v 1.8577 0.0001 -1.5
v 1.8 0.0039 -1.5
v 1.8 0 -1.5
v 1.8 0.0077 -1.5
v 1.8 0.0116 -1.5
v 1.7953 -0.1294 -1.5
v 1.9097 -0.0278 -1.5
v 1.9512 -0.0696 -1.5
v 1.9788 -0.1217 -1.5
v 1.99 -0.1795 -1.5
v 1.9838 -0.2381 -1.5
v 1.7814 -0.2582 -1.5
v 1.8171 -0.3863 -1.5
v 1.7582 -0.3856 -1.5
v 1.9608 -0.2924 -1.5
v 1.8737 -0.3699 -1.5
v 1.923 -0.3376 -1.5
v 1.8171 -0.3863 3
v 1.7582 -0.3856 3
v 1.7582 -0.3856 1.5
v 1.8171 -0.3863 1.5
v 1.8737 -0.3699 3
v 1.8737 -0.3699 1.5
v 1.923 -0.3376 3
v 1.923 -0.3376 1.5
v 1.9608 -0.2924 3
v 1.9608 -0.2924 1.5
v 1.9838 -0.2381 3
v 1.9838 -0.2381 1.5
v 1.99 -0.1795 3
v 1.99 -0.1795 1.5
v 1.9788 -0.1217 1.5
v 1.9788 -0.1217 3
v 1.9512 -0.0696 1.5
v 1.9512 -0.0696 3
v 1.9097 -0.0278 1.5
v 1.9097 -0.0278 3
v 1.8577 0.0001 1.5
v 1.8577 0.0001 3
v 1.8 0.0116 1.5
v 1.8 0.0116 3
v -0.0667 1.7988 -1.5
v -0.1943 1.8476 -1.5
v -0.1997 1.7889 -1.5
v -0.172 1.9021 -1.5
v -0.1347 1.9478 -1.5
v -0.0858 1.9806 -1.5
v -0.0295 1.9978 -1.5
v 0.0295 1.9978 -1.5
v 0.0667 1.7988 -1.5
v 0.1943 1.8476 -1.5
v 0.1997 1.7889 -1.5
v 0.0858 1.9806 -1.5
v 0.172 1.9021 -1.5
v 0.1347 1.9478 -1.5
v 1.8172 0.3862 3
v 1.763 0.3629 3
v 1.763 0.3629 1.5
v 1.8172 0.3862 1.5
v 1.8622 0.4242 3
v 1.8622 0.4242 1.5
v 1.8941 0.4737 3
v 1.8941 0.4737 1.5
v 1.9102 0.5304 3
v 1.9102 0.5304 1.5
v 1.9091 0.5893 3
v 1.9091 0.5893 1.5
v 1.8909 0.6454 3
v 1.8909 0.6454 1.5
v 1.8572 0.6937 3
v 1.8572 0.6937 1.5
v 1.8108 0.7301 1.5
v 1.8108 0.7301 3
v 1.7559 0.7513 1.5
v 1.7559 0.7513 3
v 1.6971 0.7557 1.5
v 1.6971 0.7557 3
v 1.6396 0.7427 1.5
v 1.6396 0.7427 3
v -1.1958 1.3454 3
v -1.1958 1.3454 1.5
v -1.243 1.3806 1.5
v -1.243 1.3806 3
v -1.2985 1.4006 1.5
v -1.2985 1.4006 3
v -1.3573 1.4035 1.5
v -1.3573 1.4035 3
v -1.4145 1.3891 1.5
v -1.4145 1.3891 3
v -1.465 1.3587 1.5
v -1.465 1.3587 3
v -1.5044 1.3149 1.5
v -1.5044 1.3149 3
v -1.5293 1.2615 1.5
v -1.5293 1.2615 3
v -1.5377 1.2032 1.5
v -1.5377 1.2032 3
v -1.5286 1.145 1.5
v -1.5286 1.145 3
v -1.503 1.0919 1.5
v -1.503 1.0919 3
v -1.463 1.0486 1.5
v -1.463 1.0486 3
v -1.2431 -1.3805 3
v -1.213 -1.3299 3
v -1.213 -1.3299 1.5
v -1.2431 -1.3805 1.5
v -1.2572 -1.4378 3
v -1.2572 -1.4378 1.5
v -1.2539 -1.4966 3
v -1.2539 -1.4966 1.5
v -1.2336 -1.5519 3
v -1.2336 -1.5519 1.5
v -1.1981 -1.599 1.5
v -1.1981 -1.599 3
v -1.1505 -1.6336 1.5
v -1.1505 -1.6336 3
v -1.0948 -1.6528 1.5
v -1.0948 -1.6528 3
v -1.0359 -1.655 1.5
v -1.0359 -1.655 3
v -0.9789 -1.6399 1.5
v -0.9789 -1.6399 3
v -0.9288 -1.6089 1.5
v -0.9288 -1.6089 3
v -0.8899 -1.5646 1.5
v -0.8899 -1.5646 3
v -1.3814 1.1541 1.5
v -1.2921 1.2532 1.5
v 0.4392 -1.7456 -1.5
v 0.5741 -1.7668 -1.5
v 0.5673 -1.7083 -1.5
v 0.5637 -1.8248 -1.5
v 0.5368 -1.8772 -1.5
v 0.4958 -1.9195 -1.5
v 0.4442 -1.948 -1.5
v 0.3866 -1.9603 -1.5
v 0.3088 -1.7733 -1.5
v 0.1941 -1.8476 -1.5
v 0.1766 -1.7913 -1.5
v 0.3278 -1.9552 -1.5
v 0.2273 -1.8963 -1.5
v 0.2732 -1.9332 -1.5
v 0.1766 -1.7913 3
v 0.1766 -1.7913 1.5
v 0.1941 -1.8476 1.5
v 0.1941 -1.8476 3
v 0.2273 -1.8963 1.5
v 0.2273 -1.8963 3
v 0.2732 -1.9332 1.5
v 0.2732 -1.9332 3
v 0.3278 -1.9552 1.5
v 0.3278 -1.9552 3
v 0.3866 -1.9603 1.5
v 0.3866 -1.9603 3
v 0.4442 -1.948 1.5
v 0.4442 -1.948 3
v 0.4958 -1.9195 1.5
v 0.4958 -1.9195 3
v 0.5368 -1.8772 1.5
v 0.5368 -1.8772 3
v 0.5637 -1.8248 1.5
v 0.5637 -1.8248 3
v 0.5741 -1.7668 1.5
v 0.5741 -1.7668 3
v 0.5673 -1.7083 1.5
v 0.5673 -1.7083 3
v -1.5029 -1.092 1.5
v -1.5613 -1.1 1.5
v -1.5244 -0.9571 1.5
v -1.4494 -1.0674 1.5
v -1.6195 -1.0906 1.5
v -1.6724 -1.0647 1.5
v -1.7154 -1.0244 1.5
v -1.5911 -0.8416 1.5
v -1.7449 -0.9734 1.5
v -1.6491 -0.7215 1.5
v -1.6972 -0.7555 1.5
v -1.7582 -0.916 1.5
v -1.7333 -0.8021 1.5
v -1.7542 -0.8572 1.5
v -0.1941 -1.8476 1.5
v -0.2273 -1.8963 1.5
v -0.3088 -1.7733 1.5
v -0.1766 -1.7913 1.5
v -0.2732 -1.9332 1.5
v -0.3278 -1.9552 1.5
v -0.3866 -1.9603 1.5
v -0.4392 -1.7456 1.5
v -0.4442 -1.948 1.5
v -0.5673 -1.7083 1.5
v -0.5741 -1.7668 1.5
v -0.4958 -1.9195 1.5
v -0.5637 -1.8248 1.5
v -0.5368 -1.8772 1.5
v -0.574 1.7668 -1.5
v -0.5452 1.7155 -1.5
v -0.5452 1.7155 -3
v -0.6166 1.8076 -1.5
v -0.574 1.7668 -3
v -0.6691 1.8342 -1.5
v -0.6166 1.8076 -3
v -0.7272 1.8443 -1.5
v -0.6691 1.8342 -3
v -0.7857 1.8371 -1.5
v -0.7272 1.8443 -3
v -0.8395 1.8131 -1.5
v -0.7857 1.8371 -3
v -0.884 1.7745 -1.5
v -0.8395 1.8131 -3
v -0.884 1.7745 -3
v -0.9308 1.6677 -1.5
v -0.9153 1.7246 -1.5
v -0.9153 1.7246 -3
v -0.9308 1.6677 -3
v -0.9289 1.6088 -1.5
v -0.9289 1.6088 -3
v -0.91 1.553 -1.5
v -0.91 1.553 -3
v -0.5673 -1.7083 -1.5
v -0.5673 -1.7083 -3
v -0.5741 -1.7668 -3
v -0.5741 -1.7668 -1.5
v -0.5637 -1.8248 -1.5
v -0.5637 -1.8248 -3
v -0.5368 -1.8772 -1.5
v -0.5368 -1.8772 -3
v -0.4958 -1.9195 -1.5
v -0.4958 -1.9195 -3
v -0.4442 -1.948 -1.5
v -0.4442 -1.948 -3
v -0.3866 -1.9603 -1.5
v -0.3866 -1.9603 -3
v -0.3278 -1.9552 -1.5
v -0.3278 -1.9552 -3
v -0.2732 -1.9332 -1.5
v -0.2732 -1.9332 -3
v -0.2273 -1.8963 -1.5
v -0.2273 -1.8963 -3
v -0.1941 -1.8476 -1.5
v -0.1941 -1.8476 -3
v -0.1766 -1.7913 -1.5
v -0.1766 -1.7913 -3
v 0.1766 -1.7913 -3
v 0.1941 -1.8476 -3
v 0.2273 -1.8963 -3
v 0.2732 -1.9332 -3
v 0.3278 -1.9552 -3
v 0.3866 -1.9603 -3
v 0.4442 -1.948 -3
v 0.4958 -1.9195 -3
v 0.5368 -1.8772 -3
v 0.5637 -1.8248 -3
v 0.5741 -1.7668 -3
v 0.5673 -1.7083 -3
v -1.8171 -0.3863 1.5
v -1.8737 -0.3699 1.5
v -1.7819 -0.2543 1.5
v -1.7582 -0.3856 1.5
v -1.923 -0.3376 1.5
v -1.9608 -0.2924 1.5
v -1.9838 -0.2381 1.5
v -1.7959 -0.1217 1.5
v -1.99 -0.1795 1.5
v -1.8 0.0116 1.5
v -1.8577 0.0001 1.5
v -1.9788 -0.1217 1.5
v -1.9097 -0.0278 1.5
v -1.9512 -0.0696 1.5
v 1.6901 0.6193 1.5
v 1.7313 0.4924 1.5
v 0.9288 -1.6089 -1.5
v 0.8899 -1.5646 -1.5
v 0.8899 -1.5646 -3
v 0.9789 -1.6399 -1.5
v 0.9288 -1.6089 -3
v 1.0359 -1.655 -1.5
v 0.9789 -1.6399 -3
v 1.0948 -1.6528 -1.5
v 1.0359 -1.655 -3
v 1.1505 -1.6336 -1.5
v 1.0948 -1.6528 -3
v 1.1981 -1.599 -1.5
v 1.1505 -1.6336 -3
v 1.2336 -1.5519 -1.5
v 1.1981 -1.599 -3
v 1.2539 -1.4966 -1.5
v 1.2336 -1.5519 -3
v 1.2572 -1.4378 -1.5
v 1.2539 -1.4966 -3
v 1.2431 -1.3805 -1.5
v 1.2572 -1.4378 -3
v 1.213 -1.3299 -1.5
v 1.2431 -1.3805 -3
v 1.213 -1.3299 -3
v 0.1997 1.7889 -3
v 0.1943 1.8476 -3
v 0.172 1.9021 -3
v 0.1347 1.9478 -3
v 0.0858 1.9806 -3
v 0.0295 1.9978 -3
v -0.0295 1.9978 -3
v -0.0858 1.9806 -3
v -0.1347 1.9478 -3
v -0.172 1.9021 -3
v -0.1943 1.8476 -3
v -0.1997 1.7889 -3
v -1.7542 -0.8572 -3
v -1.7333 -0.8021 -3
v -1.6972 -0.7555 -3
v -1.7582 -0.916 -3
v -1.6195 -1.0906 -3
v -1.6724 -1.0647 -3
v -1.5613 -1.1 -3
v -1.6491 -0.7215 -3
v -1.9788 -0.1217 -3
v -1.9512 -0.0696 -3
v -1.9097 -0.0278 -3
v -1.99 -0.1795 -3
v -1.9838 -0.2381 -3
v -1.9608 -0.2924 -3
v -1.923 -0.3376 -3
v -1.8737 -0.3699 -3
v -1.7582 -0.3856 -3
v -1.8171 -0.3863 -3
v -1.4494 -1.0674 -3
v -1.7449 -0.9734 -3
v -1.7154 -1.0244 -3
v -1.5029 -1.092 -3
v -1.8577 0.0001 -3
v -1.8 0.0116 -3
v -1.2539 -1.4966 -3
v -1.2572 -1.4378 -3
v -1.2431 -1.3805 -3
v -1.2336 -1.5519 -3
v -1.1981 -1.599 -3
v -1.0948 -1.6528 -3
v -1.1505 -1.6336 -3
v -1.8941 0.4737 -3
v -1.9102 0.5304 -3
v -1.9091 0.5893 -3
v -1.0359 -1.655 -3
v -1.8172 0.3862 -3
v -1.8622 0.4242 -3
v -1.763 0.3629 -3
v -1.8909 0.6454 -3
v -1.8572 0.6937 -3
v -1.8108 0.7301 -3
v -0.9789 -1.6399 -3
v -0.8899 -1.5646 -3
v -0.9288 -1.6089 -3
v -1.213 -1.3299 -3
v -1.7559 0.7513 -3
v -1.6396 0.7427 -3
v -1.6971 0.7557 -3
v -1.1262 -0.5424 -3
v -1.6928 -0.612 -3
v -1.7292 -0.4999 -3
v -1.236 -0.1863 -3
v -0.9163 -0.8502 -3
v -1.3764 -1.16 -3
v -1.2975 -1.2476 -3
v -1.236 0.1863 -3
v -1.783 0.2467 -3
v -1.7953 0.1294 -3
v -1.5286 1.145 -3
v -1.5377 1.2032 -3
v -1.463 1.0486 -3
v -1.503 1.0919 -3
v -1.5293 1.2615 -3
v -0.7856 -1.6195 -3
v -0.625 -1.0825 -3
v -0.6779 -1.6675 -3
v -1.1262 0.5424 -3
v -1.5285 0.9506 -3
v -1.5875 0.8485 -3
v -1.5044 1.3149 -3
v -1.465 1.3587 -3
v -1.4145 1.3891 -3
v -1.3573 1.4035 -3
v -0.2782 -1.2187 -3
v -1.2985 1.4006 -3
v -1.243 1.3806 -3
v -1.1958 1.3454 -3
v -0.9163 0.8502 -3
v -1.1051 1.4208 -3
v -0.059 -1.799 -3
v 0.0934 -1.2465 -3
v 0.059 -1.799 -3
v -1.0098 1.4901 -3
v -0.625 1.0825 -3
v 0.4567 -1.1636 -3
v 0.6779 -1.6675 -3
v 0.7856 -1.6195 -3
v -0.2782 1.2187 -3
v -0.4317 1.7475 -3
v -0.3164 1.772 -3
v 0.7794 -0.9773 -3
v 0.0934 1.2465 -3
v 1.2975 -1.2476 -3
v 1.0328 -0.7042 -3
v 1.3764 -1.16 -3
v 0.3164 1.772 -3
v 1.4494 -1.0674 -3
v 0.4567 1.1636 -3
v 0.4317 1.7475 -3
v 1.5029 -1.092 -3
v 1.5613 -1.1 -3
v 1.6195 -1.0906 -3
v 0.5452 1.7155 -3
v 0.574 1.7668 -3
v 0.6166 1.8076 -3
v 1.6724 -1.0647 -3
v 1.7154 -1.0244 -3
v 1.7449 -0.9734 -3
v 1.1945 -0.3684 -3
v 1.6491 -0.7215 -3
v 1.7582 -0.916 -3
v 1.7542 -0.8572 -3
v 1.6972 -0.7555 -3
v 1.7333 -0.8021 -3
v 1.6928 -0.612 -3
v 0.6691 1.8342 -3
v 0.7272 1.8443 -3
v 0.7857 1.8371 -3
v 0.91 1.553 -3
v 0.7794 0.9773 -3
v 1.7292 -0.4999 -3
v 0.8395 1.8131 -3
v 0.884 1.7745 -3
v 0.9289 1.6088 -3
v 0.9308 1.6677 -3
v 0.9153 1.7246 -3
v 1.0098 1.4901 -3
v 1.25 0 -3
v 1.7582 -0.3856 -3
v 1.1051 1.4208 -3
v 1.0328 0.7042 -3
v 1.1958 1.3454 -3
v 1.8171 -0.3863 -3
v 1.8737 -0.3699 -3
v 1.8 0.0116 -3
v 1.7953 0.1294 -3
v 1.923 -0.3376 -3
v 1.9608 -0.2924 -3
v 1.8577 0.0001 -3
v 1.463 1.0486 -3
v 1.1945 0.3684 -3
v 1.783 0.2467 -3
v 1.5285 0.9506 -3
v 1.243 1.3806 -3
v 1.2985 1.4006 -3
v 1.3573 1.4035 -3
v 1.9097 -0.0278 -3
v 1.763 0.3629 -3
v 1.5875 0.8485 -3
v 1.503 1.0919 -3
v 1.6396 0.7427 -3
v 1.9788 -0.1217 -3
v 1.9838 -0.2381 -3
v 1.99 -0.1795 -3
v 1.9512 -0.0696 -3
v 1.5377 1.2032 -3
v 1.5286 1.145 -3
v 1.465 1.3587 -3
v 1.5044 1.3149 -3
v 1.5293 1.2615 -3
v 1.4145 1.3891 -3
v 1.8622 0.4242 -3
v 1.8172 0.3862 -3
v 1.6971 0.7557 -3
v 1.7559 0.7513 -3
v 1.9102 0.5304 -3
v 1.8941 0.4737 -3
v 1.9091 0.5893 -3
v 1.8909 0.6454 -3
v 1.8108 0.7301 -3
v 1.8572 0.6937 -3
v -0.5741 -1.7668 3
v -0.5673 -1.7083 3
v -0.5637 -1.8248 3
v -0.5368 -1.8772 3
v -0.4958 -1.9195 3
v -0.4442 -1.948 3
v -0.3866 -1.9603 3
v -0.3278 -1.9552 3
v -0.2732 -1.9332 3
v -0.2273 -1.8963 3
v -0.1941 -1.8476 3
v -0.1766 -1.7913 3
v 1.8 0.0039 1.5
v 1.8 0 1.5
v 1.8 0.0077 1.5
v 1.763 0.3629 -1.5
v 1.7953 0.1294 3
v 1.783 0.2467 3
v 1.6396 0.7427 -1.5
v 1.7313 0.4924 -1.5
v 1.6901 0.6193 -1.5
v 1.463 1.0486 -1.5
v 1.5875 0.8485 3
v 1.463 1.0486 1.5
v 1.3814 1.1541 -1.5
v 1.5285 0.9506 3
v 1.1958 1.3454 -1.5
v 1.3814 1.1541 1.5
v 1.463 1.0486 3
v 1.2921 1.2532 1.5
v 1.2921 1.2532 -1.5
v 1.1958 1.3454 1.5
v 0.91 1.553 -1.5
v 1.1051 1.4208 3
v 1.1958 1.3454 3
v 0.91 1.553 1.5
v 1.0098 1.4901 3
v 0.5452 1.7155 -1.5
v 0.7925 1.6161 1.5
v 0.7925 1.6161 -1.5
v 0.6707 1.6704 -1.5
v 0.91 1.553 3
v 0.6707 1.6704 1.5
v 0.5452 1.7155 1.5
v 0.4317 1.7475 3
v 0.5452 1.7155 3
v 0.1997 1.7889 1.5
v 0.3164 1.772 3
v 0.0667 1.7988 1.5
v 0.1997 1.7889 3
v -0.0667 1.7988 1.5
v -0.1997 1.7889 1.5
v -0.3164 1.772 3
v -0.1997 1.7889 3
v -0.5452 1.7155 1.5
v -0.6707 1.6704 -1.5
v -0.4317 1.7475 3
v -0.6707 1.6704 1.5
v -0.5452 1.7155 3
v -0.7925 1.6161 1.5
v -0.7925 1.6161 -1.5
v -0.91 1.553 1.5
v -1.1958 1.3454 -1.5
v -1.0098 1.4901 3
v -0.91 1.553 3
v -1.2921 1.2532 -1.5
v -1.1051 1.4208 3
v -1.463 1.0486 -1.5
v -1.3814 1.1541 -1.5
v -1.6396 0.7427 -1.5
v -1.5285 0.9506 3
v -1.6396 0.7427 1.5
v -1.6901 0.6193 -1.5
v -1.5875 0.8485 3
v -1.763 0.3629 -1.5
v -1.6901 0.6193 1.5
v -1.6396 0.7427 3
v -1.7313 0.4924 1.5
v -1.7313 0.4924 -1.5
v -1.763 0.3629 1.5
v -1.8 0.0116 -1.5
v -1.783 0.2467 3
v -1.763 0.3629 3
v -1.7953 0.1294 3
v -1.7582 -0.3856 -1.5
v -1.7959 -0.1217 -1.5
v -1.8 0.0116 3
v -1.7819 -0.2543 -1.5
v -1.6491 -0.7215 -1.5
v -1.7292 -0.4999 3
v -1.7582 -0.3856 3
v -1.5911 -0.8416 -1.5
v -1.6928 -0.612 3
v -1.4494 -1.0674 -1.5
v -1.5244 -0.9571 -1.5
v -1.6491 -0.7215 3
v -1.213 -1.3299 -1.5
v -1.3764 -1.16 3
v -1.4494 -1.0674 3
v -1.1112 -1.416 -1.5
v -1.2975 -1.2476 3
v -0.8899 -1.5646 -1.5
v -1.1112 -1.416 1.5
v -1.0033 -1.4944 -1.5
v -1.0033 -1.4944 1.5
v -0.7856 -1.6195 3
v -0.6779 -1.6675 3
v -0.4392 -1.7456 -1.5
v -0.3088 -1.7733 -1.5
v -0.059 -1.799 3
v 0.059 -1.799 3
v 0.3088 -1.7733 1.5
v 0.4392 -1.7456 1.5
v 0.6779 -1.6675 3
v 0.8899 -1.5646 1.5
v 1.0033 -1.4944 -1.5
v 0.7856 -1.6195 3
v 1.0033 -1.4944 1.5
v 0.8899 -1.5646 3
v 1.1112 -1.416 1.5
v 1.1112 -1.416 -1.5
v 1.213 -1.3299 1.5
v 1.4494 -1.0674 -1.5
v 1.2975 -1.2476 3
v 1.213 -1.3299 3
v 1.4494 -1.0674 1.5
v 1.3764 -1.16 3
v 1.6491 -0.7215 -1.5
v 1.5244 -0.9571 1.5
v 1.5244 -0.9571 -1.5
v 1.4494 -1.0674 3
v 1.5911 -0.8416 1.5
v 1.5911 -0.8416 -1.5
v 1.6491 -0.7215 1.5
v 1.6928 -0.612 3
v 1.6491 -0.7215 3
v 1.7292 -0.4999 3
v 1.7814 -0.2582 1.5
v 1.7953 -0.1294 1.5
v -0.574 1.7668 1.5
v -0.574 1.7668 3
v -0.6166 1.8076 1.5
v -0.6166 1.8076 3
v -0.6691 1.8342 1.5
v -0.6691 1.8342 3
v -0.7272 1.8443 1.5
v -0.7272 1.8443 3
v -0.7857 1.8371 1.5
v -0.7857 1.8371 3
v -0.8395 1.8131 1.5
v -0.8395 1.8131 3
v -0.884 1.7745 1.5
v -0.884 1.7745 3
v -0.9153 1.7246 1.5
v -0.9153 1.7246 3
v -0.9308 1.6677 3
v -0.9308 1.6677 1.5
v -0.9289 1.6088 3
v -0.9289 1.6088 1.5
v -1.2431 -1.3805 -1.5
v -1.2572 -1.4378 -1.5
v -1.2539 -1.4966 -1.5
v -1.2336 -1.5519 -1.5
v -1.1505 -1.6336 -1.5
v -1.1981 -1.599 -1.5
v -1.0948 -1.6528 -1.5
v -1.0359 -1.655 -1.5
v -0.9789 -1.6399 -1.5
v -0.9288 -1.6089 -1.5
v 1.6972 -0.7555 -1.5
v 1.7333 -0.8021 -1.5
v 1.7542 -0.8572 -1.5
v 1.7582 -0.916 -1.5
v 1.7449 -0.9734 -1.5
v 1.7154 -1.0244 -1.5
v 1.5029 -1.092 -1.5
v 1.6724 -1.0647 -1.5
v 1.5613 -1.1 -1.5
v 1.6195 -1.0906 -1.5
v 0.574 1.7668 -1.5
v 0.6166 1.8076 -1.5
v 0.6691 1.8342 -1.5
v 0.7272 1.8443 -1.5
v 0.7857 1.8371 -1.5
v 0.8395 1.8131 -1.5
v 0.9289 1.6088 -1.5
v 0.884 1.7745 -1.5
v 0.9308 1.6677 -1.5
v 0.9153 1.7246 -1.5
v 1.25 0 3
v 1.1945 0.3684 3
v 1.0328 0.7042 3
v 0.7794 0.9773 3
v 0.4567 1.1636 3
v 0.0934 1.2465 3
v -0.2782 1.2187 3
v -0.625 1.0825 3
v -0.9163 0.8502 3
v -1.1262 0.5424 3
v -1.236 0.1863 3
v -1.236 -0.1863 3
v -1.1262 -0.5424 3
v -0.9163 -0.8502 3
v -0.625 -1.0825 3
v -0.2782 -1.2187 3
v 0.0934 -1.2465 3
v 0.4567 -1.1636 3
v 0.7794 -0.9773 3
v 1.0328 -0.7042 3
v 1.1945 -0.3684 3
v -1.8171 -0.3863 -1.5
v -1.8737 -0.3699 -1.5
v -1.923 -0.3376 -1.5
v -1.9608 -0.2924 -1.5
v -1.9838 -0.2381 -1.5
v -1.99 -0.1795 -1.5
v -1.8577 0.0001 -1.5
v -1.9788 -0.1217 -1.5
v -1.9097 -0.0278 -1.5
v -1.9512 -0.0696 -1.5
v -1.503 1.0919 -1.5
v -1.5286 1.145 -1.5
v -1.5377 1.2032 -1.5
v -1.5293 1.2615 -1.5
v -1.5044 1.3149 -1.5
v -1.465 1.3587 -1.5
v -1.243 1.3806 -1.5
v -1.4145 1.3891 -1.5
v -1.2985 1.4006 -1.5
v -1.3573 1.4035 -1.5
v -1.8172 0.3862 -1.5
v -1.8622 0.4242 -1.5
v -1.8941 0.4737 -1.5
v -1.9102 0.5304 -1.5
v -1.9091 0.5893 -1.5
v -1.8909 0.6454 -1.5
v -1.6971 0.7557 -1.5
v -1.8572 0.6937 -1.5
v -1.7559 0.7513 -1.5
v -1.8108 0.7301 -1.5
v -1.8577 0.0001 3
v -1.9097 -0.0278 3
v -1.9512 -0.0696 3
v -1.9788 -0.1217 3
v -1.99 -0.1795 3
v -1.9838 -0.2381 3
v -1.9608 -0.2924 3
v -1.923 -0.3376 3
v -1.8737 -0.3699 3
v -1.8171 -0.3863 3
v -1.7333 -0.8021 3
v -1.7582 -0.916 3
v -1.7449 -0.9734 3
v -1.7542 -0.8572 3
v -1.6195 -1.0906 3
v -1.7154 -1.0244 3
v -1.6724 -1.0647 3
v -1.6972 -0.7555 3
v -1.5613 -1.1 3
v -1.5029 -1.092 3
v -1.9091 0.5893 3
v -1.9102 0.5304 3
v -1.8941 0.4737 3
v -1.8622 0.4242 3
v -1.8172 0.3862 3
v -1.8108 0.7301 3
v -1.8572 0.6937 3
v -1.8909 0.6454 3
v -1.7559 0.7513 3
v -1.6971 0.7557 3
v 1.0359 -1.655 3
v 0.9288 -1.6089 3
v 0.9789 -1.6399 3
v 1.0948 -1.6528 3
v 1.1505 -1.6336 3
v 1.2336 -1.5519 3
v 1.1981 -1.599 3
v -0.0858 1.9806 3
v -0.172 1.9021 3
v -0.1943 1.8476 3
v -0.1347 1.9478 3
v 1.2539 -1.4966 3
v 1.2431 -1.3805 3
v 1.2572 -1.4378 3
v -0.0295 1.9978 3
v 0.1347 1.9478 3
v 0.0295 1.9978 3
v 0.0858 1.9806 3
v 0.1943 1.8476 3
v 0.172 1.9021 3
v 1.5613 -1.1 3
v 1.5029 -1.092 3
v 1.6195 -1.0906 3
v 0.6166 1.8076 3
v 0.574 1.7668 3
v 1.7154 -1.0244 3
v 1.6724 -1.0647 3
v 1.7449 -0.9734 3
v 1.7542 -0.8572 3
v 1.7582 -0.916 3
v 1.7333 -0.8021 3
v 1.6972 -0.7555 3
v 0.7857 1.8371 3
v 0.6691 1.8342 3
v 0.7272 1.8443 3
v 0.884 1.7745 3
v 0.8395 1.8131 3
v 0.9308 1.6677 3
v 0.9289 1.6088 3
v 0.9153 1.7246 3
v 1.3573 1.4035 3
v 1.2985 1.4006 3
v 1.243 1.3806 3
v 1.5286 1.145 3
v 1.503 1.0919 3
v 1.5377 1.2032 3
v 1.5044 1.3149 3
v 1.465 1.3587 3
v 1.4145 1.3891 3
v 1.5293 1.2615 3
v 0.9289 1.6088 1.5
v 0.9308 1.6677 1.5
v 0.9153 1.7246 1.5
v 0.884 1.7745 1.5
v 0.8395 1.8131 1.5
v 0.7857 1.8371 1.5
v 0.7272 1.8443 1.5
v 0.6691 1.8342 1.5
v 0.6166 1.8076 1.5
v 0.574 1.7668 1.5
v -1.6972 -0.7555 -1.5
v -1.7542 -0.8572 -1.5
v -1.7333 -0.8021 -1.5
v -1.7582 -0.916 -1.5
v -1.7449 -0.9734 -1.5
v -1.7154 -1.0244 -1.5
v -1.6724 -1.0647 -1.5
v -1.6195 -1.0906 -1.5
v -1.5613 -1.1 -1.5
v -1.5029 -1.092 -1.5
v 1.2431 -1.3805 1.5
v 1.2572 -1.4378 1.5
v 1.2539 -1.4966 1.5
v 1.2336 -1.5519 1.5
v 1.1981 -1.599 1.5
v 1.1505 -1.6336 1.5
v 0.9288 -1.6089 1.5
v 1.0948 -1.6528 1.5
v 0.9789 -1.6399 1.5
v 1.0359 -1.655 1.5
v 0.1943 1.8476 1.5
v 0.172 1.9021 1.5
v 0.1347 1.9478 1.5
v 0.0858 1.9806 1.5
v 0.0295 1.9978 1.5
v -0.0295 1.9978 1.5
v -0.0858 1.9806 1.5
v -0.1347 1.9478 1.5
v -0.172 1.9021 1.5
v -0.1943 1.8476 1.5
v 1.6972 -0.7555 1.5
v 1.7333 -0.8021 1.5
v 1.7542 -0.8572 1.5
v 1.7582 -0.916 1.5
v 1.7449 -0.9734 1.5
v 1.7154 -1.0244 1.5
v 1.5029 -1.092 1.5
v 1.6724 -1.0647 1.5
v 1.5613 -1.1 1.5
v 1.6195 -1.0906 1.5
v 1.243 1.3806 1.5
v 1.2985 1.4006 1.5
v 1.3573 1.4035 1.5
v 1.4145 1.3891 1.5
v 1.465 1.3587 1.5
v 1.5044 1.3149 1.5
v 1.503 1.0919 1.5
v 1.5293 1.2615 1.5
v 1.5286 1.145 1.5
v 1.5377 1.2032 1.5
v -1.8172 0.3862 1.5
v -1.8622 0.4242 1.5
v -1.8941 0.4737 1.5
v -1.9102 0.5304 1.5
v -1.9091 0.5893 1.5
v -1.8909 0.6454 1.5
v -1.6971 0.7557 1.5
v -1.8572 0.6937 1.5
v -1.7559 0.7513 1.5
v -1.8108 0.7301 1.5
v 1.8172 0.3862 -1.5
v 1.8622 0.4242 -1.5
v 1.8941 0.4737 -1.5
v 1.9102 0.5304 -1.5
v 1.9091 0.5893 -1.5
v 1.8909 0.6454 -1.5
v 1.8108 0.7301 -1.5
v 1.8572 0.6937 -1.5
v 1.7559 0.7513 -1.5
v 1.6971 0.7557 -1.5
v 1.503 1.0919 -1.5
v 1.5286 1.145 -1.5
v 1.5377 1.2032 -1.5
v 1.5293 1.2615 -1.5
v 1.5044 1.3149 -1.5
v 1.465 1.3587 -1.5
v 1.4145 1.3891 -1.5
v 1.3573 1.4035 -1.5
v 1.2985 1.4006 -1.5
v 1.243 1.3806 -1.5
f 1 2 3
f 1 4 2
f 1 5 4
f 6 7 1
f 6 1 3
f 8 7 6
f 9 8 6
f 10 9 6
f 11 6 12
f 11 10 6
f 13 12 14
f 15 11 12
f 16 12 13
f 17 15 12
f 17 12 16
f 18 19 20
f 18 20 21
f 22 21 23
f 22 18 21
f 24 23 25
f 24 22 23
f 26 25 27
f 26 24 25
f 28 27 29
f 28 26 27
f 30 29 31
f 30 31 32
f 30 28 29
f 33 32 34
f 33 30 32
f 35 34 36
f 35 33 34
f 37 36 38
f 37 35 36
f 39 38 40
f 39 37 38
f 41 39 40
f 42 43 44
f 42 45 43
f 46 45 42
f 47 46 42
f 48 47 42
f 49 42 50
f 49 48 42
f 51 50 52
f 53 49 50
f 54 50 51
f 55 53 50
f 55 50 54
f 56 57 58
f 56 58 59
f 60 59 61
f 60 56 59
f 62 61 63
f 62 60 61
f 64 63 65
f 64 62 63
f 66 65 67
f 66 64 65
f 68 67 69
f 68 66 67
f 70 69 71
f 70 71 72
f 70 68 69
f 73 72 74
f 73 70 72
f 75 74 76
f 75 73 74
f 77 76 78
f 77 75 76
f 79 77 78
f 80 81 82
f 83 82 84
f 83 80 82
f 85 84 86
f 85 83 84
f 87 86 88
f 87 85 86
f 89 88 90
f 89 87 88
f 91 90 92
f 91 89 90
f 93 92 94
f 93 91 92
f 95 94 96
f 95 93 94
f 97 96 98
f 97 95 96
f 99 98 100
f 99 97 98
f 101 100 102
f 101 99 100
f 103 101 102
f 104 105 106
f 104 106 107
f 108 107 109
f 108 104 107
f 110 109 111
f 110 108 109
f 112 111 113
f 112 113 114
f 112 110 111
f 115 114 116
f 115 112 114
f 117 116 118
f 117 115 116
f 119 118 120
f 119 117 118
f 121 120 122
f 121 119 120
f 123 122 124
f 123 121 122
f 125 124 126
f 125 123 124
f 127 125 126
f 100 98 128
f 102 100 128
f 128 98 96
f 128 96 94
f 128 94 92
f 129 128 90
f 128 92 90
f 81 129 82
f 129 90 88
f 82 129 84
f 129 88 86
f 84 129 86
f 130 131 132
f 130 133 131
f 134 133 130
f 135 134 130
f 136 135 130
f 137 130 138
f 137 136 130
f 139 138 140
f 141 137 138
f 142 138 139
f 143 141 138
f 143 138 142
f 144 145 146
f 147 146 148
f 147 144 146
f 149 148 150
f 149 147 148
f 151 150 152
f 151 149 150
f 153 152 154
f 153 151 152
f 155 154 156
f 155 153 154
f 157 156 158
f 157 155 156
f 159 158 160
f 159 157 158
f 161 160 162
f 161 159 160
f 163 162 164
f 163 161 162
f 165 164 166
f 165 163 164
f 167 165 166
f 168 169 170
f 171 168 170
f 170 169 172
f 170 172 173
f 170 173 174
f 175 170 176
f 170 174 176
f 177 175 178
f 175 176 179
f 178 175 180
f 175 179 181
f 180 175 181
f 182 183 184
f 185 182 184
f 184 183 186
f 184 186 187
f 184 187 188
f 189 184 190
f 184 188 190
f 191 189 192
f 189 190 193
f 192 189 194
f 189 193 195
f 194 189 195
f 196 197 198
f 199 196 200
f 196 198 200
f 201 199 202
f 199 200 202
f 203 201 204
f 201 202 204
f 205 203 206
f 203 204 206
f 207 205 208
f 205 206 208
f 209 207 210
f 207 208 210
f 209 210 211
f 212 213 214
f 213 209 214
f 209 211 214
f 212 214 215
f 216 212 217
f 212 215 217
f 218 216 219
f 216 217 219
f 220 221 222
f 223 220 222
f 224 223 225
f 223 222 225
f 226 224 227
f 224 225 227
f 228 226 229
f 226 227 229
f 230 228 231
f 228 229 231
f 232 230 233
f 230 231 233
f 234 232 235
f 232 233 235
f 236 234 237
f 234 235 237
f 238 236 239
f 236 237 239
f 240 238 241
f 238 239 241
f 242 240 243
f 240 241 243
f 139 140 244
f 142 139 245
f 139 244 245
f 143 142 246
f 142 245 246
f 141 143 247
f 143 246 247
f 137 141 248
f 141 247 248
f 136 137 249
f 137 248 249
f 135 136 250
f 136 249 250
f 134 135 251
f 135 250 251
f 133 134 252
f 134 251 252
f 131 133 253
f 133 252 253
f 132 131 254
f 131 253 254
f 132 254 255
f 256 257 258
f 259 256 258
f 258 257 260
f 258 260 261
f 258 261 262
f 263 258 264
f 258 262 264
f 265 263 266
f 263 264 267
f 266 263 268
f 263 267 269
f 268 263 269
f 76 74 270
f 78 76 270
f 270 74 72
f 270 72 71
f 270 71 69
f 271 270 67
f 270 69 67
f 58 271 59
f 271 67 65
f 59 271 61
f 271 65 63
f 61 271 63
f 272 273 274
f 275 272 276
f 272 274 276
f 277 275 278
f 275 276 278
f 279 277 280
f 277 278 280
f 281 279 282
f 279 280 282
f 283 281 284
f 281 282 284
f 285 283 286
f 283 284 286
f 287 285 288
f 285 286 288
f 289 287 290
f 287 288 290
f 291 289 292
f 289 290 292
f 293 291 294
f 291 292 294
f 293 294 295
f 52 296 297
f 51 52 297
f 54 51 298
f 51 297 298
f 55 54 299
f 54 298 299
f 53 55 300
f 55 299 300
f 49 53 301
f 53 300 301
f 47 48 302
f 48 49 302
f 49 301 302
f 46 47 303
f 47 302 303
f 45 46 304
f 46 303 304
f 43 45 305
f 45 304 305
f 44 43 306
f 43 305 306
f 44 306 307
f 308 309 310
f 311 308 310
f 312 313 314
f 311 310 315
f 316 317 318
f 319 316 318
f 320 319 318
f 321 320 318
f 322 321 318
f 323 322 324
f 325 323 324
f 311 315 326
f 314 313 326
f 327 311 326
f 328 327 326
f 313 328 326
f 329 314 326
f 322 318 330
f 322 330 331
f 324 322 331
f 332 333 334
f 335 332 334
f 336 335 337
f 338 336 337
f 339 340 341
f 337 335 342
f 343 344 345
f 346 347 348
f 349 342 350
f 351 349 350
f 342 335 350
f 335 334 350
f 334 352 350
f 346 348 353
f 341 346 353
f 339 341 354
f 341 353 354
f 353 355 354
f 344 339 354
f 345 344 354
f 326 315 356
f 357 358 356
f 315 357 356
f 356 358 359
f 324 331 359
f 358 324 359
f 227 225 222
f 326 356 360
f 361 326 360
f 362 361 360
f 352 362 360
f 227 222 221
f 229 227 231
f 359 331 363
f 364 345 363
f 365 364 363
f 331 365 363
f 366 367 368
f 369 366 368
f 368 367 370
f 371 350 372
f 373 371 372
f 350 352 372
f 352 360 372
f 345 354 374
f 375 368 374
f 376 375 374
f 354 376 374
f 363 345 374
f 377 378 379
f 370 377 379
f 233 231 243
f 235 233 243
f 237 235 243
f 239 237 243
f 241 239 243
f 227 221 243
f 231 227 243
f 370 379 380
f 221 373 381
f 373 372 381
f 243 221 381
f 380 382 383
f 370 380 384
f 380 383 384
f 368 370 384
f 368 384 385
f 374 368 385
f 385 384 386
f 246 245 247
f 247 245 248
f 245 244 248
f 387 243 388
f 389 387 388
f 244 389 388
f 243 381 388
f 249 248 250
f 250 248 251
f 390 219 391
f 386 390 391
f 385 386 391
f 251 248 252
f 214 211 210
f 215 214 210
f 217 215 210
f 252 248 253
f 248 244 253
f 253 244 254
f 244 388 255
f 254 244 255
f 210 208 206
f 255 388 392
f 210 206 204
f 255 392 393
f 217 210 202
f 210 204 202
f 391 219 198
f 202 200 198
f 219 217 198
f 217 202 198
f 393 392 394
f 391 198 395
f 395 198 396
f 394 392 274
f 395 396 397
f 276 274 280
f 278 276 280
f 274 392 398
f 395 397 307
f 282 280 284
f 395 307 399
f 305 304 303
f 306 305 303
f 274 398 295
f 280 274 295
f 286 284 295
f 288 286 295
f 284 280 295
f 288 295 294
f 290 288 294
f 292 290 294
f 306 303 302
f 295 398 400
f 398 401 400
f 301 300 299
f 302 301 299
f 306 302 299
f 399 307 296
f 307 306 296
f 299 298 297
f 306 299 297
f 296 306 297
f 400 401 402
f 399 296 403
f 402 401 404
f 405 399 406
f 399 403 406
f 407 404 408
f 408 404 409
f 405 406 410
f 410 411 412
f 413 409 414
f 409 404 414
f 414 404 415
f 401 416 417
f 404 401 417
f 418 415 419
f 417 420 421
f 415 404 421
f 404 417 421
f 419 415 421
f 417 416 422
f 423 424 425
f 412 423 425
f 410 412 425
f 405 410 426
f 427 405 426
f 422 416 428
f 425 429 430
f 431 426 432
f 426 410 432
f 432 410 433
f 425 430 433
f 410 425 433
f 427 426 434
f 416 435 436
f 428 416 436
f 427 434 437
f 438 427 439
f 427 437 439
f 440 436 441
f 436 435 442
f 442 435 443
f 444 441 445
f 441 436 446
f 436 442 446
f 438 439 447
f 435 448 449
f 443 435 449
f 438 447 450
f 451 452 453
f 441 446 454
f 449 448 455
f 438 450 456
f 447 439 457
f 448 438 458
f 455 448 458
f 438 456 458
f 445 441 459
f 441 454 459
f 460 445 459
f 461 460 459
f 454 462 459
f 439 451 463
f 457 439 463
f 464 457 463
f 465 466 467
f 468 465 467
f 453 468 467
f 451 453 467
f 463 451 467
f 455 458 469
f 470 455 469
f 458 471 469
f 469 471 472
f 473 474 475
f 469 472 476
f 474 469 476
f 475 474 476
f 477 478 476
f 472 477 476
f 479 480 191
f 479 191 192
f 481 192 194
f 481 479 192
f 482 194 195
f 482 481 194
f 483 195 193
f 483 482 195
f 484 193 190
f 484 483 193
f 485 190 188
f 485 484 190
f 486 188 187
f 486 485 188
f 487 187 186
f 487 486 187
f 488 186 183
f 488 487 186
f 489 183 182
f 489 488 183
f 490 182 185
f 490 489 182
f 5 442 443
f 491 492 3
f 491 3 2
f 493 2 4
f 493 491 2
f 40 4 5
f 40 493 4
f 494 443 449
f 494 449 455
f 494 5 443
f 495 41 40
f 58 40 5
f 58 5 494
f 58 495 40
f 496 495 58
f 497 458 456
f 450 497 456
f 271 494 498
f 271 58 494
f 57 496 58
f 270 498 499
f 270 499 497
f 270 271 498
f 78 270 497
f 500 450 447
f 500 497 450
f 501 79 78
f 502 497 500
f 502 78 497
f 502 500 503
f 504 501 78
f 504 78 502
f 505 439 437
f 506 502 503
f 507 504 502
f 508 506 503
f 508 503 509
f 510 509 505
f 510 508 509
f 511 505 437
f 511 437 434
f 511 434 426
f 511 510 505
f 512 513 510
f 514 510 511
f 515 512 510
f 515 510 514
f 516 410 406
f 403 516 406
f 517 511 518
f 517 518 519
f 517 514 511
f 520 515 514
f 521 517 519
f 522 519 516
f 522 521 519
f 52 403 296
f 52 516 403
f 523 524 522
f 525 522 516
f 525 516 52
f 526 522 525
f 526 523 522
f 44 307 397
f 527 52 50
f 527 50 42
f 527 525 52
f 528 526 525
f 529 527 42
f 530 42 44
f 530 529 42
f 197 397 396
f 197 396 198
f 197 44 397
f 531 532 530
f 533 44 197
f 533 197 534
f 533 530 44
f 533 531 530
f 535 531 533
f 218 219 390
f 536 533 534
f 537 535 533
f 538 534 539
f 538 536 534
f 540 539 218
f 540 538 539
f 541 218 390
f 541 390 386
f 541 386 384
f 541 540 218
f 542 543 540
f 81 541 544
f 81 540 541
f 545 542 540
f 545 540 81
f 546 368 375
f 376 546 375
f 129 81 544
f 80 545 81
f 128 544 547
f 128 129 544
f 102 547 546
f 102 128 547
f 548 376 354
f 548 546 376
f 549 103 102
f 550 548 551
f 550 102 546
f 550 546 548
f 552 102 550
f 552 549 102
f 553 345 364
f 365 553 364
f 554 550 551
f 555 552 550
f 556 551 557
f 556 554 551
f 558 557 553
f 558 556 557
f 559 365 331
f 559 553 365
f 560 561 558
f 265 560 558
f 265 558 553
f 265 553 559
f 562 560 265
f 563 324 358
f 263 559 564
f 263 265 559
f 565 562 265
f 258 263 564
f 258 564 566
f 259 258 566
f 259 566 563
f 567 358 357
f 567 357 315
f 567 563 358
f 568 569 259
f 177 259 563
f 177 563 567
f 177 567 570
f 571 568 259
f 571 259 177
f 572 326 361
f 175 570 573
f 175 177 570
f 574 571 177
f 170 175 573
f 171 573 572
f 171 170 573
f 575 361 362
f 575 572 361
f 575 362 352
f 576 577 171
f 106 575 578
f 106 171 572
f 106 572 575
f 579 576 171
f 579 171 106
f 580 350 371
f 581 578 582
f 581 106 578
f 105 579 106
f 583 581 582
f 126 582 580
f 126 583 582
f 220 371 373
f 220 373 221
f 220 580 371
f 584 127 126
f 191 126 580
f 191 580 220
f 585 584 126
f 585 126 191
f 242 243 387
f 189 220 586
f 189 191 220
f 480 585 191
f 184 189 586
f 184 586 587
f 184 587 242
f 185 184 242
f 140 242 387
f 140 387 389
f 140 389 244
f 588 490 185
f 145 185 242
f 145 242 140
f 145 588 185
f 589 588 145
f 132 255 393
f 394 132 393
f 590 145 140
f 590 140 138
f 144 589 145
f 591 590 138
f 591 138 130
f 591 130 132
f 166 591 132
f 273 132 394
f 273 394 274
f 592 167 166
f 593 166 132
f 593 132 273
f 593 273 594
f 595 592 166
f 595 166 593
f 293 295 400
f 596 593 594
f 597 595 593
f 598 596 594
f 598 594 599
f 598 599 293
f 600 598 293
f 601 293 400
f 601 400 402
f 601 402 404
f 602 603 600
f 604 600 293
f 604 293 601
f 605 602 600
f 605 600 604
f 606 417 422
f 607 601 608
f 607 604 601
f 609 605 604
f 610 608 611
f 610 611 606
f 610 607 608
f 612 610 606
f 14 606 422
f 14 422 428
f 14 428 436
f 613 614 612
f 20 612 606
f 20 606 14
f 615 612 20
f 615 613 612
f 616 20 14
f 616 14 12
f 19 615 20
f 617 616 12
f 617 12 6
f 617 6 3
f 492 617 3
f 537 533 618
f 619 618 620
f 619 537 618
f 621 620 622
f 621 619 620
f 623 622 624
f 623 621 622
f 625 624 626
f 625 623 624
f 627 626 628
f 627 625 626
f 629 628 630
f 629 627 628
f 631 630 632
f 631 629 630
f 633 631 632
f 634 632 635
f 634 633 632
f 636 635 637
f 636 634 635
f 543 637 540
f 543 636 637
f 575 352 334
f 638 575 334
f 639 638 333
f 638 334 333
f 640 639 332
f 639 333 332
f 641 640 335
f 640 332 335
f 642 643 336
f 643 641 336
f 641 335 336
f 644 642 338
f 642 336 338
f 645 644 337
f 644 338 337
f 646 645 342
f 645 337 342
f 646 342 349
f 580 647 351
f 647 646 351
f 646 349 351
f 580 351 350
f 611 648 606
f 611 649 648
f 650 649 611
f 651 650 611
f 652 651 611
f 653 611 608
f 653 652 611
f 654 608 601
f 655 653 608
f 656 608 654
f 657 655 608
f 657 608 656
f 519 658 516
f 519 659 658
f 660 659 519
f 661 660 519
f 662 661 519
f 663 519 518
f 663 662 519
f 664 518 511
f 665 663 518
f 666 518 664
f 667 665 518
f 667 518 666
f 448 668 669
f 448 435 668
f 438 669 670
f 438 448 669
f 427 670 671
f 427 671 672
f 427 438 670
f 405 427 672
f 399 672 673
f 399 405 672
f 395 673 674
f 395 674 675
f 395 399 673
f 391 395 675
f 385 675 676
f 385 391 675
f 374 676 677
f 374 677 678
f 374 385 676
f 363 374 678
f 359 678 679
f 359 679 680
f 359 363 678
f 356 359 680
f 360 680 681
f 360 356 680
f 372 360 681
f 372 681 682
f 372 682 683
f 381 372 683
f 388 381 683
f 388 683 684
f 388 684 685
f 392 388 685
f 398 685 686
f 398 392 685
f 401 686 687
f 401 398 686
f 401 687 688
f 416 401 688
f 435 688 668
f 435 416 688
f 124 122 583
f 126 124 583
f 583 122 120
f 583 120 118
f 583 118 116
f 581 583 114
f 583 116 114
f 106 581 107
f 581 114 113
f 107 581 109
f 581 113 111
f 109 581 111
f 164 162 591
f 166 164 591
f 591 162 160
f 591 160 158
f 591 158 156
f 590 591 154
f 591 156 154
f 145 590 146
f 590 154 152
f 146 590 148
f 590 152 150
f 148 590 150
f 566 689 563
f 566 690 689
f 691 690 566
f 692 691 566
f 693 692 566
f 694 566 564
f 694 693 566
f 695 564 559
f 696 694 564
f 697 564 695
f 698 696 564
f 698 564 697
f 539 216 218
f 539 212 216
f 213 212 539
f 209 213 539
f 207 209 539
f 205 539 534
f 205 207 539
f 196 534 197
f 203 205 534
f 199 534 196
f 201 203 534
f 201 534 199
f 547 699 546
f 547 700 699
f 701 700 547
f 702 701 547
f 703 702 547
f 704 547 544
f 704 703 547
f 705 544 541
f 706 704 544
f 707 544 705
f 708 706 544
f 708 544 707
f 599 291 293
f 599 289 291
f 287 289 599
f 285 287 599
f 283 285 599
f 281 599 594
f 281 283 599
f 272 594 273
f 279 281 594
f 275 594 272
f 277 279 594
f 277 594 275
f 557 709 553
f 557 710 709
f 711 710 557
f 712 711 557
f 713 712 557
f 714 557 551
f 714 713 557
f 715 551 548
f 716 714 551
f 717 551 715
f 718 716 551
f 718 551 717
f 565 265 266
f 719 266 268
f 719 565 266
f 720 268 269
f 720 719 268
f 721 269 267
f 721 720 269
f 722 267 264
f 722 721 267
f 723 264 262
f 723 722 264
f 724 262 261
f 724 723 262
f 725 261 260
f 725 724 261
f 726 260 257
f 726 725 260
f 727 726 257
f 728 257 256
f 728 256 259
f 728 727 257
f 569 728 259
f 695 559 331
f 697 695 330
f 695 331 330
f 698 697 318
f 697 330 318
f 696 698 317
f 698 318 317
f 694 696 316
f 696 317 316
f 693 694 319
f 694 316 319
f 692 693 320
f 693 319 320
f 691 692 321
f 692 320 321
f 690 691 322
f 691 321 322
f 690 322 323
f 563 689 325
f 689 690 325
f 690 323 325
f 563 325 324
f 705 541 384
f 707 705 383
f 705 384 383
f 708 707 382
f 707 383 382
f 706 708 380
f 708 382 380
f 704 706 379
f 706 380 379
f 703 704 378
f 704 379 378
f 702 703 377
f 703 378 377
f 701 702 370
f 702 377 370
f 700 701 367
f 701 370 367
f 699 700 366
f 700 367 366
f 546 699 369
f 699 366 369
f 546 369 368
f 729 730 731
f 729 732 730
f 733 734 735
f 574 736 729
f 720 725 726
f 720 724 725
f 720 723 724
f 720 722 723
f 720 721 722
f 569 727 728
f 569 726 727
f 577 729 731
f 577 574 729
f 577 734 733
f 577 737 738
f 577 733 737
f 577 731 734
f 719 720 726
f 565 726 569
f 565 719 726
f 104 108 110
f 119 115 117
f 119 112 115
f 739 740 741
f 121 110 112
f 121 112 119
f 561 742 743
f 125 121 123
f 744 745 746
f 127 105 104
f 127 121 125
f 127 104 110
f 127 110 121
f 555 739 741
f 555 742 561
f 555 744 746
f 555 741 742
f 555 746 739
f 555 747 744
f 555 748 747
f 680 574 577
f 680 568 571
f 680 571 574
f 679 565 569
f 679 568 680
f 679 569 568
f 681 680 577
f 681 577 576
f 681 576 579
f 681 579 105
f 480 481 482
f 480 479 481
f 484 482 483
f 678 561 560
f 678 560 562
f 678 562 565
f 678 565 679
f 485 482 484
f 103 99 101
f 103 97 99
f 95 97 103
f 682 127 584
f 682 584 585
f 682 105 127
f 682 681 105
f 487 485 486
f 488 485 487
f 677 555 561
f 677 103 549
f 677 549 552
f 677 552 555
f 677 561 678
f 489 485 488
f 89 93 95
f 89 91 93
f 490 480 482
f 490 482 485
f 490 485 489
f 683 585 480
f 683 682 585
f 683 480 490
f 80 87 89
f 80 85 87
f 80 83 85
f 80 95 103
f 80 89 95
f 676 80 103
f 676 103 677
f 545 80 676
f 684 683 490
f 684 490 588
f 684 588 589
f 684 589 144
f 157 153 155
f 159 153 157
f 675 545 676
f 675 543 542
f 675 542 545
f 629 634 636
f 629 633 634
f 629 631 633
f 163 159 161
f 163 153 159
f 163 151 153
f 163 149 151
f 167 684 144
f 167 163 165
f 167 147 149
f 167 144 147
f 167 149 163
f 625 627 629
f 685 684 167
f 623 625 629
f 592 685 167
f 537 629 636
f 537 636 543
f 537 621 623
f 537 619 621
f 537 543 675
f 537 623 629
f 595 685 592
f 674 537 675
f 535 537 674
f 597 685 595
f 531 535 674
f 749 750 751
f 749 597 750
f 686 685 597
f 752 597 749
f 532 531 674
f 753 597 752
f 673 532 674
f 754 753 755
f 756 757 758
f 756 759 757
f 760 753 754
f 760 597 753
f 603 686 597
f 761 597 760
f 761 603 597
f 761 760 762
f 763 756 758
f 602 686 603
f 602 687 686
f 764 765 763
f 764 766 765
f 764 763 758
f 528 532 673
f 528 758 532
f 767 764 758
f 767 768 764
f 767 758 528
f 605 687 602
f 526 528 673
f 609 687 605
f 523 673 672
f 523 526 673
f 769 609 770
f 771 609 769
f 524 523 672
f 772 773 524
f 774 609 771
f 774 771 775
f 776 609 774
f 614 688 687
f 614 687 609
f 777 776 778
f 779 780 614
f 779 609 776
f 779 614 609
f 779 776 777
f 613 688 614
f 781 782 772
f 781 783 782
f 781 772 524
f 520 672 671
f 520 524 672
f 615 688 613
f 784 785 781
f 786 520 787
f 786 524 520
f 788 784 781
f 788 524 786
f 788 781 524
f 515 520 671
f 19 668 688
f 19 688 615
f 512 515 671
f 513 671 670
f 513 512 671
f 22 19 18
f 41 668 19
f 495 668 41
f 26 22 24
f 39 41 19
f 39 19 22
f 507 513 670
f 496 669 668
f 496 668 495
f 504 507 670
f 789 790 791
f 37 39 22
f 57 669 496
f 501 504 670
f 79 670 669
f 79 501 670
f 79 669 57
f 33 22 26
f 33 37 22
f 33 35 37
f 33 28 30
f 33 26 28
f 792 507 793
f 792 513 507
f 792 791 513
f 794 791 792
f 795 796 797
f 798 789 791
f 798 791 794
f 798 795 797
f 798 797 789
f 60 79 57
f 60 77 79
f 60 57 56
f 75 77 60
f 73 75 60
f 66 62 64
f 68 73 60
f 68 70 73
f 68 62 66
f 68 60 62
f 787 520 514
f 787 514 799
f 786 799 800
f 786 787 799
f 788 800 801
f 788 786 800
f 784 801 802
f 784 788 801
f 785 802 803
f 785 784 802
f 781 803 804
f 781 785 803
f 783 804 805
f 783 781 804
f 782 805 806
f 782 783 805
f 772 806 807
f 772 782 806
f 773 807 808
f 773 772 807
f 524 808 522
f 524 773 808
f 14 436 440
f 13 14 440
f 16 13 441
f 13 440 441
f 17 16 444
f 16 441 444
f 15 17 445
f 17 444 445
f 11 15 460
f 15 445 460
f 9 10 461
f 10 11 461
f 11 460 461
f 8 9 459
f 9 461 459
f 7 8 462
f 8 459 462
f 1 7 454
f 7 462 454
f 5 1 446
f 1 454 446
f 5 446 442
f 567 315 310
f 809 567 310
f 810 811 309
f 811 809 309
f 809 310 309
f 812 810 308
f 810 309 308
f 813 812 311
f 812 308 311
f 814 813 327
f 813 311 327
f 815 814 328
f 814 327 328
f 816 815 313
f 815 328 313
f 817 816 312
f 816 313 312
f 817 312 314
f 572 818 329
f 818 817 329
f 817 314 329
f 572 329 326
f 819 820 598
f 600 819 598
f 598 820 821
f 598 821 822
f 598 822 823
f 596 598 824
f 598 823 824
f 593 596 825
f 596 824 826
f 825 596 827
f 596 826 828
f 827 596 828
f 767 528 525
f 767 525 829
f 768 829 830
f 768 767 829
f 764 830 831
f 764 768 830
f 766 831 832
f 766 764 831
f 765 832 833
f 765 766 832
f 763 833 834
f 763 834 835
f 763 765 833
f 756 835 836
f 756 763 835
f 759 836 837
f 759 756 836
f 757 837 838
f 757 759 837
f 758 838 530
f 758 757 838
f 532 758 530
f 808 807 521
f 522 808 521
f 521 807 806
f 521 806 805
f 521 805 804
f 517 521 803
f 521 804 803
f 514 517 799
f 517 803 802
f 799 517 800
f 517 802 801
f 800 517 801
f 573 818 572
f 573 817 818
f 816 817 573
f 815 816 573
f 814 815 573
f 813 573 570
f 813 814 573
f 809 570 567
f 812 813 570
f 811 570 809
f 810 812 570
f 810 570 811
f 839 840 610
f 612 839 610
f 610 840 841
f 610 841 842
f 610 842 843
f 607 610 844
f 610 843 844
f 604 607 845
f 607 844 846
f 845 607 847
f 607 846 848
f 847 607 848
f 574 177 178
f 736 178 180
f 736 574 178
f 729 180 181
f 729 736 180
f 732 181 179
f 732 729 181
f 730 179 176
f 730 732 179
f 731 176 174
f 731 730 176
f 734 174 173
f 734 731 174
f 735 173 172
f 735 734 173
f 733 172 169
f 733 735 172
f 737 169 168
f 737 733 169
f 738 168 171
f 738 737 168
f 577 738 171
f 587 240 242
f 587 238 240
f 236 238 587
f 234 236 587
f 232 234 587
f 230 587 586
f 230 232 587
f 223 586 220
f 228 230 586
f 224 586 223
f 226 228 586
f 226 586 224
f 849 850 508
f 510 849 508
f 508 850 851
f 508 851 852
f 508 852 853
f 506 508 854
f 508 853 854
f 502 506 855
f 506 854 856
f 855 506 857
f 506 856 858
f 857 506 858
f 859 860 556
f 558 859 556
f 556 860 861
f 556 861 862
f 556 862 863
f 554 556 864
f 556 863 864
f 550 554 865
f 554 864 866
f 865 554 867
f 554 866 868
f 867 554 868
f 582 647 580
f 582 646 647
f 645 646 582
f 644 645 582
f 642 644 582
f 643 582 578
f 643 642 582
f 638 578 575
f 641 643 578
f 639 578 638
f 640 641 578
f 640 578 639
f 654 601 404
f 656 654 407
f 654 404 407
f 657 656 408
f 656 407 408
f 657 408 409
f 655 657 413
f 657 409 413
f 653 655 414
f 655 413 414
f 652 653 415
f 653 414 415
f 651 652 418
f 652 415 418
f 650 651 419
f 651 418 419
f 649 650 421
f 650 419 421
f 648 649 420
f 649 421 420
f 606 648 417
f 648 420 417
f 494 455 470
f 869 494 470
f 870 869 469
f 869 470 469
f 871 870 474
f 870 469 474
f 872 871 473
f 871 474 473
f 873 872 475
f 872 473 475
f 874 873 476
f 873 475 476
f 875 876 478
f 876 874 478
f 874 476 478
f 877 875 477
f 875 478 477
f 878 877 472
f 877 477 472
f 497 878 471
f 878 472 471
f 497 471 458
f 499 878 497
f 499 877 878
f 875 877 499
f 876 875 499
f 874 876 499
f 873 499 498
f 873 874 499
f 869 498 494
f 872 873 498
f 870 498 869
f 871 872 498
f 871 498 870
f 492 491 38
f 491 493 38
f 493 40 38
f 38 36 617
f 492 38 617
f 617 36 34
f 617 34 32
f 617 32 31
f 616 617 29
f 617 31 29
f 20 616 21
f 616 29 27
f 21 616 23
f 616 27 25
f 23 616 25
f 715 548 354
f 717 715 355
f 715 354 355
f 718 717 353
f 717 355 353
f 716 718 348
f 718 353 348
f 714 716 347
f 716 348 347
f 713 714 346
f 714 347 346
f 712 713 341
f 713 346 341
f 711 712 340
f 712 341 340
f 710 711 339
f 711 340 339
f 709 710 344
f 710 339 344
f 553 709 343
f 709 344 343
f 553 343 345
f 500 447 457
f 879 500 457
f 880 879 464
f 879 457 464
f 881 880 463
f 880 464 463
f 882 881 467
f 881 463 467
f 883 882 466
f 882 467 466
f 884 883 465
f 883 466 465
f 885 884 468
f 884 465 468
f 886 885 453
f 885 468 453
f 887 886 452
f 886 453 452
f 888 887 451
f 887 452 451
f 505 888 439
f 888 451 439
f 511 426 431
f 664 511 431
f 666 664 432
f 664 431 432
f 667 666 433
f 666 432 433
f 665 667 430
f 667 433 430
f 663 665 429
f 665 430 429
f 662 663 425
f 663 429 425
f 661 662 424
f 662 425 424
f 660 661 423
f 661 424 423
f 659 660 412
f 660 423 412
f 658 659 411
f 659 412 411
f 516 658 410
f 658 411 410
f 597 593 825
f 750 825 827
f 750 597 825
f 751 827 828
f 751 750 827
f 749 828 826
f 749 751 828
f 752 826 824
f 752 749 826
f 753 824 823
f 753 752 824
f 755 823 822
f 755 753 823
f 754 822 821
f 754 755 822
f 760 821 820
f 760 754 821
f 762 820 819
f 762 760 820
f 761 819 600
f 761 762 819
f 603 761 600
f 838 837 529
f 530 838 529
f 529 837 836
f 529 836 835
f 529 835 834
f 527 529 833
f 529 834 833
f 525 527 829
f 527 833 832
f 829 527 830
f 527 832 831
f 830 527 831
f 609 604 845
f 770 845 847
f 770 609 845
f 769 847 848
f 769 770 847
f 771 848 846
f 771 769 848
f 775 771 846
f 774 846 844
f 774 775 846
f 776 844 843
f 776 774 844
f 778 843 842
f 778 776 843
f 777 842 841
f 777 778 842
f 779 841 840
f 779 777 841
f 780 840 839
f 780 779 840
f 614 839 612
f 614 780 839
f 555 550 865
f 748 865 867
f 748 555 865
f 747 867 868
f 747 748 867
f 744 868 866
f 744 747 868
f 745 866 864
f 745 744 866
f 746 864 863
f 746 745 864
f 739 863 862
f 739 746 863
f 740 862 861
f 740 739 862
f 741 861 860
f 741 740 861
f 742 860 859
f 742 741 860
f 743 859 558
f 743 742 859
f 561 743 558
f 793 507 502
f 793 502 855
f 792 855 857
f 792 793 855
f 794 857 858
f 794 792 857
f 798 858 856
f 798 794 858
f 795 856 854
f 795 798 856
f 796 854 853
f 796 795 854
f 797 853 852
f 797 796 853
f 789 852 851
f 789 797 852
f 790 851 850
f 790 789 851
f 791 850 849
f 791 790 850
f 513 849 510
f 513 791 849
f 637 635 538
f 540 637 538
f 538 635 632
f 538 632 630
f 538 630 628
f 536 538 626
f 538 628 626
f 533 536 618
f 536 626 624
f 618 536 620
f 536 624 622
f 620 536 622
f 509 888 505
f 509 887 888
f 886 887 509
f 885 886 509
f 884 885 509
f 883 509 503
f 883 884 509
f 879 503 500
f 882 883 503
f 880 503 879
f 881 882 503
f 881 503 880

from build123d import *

# Parameters (mm, degrees)
SKETCH_R                     = 1.8
SKETCH_R_2                   = 1.25
PAD_DEPTH                    = 3
PAD_DEPTH_BACK               = 3
SKETCH001_R                  = 0.2
PAD001_DEPTH                 = 1.5
SKETCH001_POLARPATTERN_2_R   = 0.2
PAD001_POLARPATTERN_2_DEPTH  = 1.5
SKETCH001_POLARPATTERN_3_R   = 0.2
PAD001_POLARPATTERN_3_DEPTH  = 1.5
SKETCH001_POLARPATTERN_4_R   = 0.2
PAD001_POLARPATTERN_4_DEPTH  = 1.5
SKETCH001_POLARPATTERN_5_R   = 0.2
PAD001_POLARPATTERN_5_DEPTH  = 1.5
SKETCH001_POLARPATTERN_6_R   = 0.2
PAD001_POLARPATTERN_6_DEPTH  = 1.5
SKETCH001_POLARPATTERN_7_R   = 0.2
PAD001_POLARPATTERN_7_DEPTH  = 1.5
SKETCH001_POLARPATTERN_8_R   = 0.2
PAD001_POLARPATTERN_8_DEPTH  = 1.5
SKETCH001_POLARPATTERN_9_R   = 0.2
PAD001_POLARPATTERN_9_DEPTH  = 1.5
SKETCH001_POLARPATTERN_10_R  = 0.2
PAD001_POLARPATTERN_10_DEPTH = 1.5
SKETCH001_POLARPATTERN_11_R  = 0.2
PAD001_POLARPATTERN_11_DEPTH = 1.5
SKETCH001_POLARPATTERN_12_R  = 0.2
PAD001_POLARPATTERN_12_DEPTH = 1.5
SKETCH001_POLARPATTERN_13_R  = 0.2
PAD001_POLARPATTERN_13_DEPTH = 1.5
SKETCH001_POLARPATTERN_14_R  = 0.2
PAD001_POLARPATTERN_14_DEPTH = 1.5
SKETCH001_POLARPATTERN_15_R  = 0.2
PAD001_POLARPATTERN_15_DEPTH = 1.5


with BuildPart() as part:
    # Sketch → Pad (new body, two sides)
    with BuildSketch(Plane.XY) as pad_sk:
        Circle(SKETCH_R)
        Circle(SKETCH_R_2, mode=Mode.SUBTRACT)
    extrude(amount=PAD_DEPTH)
    extrude(pad_sk.sketch, amount=-PAD_DEPTH_BACK)

    # Sketch001 (on Face4 of Pad) → Pad001 (join)
    with BuildSketch(Plane.XY.offset(3)):
        with Locations((0, 1.8)):
            Circle(SKETCH001_R)
    pad001 = extrude(amount=-PAD001_DEPTH)

    # Sketch001 PolarPattern 2 → Pad001 PolarPattern 2 (add)
    with BuildSketch(Plane(origin=(0, 0, 3), x_dir=(0.913545, 0.406737, 0), z_dir=(0, 0, 1))):
        with Locations((0, 1.8)):
            Circle(SKETCH001_POLARPATTERN_2_R)
    pad001_polarpattern_2 = extrude(amount=-PAD001_POLARPATTERN_2_DEPTH)

    # Sketch001 PolarPattern 3 → Pad001 PolarPattern 3 (add)
    with BuildSketch(Plane(origin=(0, 0, 3), x_dir=(0.669131, 0.743145, 0), z_dir=(0, 0, 1))):
        with Locations((0, 1.8)):
            Circle(SKETCH001_POLARPATTERN_3_R)
    pad001_polarpattern_3 = extrude(amount=-PAD001_POLARPATTERN_3_DEPTH)

    # Sketch001 PolarPattern 4 → Pad001 PolarPattern 4 (add)
    with BuildSketch(Plane(origin=(0, 0, 3), x_dir=(0.309017, 0.951057, 0), z_dir=(0, 0, 1))):
        with Locations((0, 1.8)):
            Circle(SKETCH001_POLARPATTERN_4_R)
    pad001_polarpattern_4 = extrude(amount=-PAD001_POLARPATTERN_4_DEPTH)

    # Sketch001 PolarPattern 5 → Pad001 PolarPattern 5 (add)
    with BuildSketch(Plane(origin=(0, 0, 3), x_dir=(-0.104528, 0.994522, 0), z_dir=(0, 0, 1))):
        with Locations((0, 1.8)):
            Circle(SKETCH001_POLARPATTERN_5_R)
    pad001_polarpattern_5 = extrude(amount=-PAD001_POLARPATTERN_5_DEPTH)

    # Sketch001 PolarPattern 6 → Pad001 PolarPattern 6 (add)
    with BuildSketch(Plane(origin=(0, 0, 3), x_dir=(-0.5, 0.866025, 0), z_dir=(0, 0, 1))):
        with Locations((0, 1.8)):
            Circle(SKETCH001_POLARPATTERN_6_R)
    pad001_polarpattern_6 = extrude(amount=-PAD001_POLARPATTERN_6_DEPTH)

    # Sketch001 PolarPattern 7 → Pad001 PolarPattern 7 (add)
    with BuildSketch(Plane(origin=(0, 0, 3), x_dir=(-0.809017, 0.587785, 0), z_dir=(0, 0, 1))):
        with Locations((0, 1.8)):
            Circle(SKETCH001_POLARPATTERN_7_R)
    pad001_polarpattern_7 = extrude(amount=-PAD001_POLARPATTERN_7_DEPTH)

    # Sketch001 PolarPattern 8 → Pad001 PolarPattern 8 (add)
    with BuildSketch(Plane(origin=(0, 0, 3), x_dir=(-0.978148, 0.207912, 0), z_dir=(0, 0, 1))):
        with Locations((0, 1.8)):
            Circle(SKETCH001_POLARPATTERN_8_R)
    pad001_polarpattern_8 = extrude(amount=-PAD001_POLARPATTERN_8_DEPTH)

    # Sketch001 PolarPattern 9 → Pad001 PolarPattern 9 (add)
    with BuildSketch(Plane(origin=(0, 0, 3), x_dir=(-0.978148, -0.207912, 0), z_dir=(0, 0, 1))):
        with Locations((0, 1.8)):
            Circle(SKETCH001_POLARPATTERN_9_R)
    pad001_polarpattern_9 = extrude(amount=-PAD001_POLARPATTERN_9_DEPTH)

    # Sketch001 PolarPattern 10 → Pad001 PolarPattern 10 (add)
    with BuildSketch(Plane(origin=(0, 0, 3), x_dir=(-0.809017, -0.587785, 0), z_dir=(0, 0, 1))):
        with Locations((0, 1.8)):
            Circle(SKETCH001_POLARPATTERN_10_R)
    pad001_polarpattern_10 = extrude(amount=-PAD001_POLARPATTERN_10_DEPTH)

    # Sketch001 PolarPattern 11 → Pad001 PolarPattern 11 (add)
    with BuildSketch(Plane(origin=(0, 0, 3), x_dir=(-0.5, -0.866025, 0), z_dir=(0, 0, 1))):
        with Locations((0, 1.8)):
            Circle(SKETCH001_POLARPATTERN_11_R)
    pad001_polarpattern_11 = extrude(amount=-PAD001_POLARPATTERN_11_DEPTH)

    # Sketch001 PolarPattern 12 → Pad001 PolarPattern 12 (add)
    with BuildSketch(Plane(origin=(0, 0, 3), x_dir=(-0.104528, -0.994522, 0), z_dir=(0, 0, 1))):
        with Locations((0, 1.8)):
            Circle(SKETCH001_POLARPATTERN_12_R)
    pad001_polarpattern_12 = extrude(amount=-PAD001_POLARPATTERN_12_DEPTH)

    # Sketch001 PolarPattern 13 → Pad001 PolarPattern 13 (add)
    with BuildSketch(Plane(origin=(0, 0, 3), x_dir=(0.309017, -0.951057, 0), z_dir=(0, 0, 1))):
        with Locations((0, 1.8)):
            Circle(SKETCH001_POLARPATTERN_13_R)
    pad001_polarpattern_13 = extrude(amount=-PAD001_POLARPATTERN_13_DEPTH)

    # Sketch001 PolarPattern 14 → Pad001 PolarPattern 14 (add)
    with BuildSketch(Plane(origin=(0, 0, 3), x_dir=(0.669131, -0.743145, 0), z_dir=(0, 0, 1))):
        with Locations((0, 1.8)):
            Circle(SKETCH001_POLARPATTERN_14_R)
    pad001_polarpattern_14 = extrude(amount=-PAD001_POLARPATTERN_14_DEPTH)

    # Sketch001 PolarPattern 15 → Pad001 PolarPattern 15 (add)
    with BuildSketch(Plane(origin=(0, 0, 3), x_dir=(0.913545, -0.406737, 0), z_dir=(0, 0, 1))):
        with Locations((0, 1.8)):
            Circle(SKETCH001_POLARPATTERN_15_R)
    pad001_polarpattern_15 = extrude(amount=-PAD001_POLARPATTERN_15_DEPTH)

    # Mirrored: Pad001, Pad001 PolarPattern 2, Pad001 PolarPattern 3, Pad001 PolarPattern 4, Pad001 PolarPattern 5, Pad001 PolarPattern 6, Pad001 PolarPattern 7, Pad001 PolarPattern 8, Pad001 PolarPattern 9, Pad001 PolarPattern 10, Pad001 PolarPattern 11, Pad001 PolarPattern 12, Pad001 PolarPattern 13, Pad001 PolarPattern 14, Pad001 PolarPattern 15 across XY
    add(pad001.mirror(Plane.XY))
    add(pad001_polarpattern_2.mirror(Plane.XY))
    add(pad001_polarpattern_3.mirror(Plane.XY))
    add(pad001_polarpattern_4.mirror(Plane.XY))
    add(pad001_polarpattern_5.mirror(Plane.XY))
    add(pad001_polarpattern_6.mirror(Plane.XY))
    add(pad001_polarpattern_7.mirror(Plane.XY))
    add(pad001_polarpattern_8.mirror(Plane.XY))
    add(pad001_polarpattern_9.mirror(Plane.XY))
    add(pad001_polarpattern_10.mirror(Plane.XY))
    add(pad001_polarpattern_11.mirror(Plane.XY))
    add(pad001_polarpattern_12.mirror(Plane.XY))
    add(pad001_polarpattern_13.mirror(Plane.XY))
    add(pad001_polarpattern_14.mirror(Plane.XY))
    add(pad001_polarpattern_15.mirror(Plane.XY))


solid = part.part
